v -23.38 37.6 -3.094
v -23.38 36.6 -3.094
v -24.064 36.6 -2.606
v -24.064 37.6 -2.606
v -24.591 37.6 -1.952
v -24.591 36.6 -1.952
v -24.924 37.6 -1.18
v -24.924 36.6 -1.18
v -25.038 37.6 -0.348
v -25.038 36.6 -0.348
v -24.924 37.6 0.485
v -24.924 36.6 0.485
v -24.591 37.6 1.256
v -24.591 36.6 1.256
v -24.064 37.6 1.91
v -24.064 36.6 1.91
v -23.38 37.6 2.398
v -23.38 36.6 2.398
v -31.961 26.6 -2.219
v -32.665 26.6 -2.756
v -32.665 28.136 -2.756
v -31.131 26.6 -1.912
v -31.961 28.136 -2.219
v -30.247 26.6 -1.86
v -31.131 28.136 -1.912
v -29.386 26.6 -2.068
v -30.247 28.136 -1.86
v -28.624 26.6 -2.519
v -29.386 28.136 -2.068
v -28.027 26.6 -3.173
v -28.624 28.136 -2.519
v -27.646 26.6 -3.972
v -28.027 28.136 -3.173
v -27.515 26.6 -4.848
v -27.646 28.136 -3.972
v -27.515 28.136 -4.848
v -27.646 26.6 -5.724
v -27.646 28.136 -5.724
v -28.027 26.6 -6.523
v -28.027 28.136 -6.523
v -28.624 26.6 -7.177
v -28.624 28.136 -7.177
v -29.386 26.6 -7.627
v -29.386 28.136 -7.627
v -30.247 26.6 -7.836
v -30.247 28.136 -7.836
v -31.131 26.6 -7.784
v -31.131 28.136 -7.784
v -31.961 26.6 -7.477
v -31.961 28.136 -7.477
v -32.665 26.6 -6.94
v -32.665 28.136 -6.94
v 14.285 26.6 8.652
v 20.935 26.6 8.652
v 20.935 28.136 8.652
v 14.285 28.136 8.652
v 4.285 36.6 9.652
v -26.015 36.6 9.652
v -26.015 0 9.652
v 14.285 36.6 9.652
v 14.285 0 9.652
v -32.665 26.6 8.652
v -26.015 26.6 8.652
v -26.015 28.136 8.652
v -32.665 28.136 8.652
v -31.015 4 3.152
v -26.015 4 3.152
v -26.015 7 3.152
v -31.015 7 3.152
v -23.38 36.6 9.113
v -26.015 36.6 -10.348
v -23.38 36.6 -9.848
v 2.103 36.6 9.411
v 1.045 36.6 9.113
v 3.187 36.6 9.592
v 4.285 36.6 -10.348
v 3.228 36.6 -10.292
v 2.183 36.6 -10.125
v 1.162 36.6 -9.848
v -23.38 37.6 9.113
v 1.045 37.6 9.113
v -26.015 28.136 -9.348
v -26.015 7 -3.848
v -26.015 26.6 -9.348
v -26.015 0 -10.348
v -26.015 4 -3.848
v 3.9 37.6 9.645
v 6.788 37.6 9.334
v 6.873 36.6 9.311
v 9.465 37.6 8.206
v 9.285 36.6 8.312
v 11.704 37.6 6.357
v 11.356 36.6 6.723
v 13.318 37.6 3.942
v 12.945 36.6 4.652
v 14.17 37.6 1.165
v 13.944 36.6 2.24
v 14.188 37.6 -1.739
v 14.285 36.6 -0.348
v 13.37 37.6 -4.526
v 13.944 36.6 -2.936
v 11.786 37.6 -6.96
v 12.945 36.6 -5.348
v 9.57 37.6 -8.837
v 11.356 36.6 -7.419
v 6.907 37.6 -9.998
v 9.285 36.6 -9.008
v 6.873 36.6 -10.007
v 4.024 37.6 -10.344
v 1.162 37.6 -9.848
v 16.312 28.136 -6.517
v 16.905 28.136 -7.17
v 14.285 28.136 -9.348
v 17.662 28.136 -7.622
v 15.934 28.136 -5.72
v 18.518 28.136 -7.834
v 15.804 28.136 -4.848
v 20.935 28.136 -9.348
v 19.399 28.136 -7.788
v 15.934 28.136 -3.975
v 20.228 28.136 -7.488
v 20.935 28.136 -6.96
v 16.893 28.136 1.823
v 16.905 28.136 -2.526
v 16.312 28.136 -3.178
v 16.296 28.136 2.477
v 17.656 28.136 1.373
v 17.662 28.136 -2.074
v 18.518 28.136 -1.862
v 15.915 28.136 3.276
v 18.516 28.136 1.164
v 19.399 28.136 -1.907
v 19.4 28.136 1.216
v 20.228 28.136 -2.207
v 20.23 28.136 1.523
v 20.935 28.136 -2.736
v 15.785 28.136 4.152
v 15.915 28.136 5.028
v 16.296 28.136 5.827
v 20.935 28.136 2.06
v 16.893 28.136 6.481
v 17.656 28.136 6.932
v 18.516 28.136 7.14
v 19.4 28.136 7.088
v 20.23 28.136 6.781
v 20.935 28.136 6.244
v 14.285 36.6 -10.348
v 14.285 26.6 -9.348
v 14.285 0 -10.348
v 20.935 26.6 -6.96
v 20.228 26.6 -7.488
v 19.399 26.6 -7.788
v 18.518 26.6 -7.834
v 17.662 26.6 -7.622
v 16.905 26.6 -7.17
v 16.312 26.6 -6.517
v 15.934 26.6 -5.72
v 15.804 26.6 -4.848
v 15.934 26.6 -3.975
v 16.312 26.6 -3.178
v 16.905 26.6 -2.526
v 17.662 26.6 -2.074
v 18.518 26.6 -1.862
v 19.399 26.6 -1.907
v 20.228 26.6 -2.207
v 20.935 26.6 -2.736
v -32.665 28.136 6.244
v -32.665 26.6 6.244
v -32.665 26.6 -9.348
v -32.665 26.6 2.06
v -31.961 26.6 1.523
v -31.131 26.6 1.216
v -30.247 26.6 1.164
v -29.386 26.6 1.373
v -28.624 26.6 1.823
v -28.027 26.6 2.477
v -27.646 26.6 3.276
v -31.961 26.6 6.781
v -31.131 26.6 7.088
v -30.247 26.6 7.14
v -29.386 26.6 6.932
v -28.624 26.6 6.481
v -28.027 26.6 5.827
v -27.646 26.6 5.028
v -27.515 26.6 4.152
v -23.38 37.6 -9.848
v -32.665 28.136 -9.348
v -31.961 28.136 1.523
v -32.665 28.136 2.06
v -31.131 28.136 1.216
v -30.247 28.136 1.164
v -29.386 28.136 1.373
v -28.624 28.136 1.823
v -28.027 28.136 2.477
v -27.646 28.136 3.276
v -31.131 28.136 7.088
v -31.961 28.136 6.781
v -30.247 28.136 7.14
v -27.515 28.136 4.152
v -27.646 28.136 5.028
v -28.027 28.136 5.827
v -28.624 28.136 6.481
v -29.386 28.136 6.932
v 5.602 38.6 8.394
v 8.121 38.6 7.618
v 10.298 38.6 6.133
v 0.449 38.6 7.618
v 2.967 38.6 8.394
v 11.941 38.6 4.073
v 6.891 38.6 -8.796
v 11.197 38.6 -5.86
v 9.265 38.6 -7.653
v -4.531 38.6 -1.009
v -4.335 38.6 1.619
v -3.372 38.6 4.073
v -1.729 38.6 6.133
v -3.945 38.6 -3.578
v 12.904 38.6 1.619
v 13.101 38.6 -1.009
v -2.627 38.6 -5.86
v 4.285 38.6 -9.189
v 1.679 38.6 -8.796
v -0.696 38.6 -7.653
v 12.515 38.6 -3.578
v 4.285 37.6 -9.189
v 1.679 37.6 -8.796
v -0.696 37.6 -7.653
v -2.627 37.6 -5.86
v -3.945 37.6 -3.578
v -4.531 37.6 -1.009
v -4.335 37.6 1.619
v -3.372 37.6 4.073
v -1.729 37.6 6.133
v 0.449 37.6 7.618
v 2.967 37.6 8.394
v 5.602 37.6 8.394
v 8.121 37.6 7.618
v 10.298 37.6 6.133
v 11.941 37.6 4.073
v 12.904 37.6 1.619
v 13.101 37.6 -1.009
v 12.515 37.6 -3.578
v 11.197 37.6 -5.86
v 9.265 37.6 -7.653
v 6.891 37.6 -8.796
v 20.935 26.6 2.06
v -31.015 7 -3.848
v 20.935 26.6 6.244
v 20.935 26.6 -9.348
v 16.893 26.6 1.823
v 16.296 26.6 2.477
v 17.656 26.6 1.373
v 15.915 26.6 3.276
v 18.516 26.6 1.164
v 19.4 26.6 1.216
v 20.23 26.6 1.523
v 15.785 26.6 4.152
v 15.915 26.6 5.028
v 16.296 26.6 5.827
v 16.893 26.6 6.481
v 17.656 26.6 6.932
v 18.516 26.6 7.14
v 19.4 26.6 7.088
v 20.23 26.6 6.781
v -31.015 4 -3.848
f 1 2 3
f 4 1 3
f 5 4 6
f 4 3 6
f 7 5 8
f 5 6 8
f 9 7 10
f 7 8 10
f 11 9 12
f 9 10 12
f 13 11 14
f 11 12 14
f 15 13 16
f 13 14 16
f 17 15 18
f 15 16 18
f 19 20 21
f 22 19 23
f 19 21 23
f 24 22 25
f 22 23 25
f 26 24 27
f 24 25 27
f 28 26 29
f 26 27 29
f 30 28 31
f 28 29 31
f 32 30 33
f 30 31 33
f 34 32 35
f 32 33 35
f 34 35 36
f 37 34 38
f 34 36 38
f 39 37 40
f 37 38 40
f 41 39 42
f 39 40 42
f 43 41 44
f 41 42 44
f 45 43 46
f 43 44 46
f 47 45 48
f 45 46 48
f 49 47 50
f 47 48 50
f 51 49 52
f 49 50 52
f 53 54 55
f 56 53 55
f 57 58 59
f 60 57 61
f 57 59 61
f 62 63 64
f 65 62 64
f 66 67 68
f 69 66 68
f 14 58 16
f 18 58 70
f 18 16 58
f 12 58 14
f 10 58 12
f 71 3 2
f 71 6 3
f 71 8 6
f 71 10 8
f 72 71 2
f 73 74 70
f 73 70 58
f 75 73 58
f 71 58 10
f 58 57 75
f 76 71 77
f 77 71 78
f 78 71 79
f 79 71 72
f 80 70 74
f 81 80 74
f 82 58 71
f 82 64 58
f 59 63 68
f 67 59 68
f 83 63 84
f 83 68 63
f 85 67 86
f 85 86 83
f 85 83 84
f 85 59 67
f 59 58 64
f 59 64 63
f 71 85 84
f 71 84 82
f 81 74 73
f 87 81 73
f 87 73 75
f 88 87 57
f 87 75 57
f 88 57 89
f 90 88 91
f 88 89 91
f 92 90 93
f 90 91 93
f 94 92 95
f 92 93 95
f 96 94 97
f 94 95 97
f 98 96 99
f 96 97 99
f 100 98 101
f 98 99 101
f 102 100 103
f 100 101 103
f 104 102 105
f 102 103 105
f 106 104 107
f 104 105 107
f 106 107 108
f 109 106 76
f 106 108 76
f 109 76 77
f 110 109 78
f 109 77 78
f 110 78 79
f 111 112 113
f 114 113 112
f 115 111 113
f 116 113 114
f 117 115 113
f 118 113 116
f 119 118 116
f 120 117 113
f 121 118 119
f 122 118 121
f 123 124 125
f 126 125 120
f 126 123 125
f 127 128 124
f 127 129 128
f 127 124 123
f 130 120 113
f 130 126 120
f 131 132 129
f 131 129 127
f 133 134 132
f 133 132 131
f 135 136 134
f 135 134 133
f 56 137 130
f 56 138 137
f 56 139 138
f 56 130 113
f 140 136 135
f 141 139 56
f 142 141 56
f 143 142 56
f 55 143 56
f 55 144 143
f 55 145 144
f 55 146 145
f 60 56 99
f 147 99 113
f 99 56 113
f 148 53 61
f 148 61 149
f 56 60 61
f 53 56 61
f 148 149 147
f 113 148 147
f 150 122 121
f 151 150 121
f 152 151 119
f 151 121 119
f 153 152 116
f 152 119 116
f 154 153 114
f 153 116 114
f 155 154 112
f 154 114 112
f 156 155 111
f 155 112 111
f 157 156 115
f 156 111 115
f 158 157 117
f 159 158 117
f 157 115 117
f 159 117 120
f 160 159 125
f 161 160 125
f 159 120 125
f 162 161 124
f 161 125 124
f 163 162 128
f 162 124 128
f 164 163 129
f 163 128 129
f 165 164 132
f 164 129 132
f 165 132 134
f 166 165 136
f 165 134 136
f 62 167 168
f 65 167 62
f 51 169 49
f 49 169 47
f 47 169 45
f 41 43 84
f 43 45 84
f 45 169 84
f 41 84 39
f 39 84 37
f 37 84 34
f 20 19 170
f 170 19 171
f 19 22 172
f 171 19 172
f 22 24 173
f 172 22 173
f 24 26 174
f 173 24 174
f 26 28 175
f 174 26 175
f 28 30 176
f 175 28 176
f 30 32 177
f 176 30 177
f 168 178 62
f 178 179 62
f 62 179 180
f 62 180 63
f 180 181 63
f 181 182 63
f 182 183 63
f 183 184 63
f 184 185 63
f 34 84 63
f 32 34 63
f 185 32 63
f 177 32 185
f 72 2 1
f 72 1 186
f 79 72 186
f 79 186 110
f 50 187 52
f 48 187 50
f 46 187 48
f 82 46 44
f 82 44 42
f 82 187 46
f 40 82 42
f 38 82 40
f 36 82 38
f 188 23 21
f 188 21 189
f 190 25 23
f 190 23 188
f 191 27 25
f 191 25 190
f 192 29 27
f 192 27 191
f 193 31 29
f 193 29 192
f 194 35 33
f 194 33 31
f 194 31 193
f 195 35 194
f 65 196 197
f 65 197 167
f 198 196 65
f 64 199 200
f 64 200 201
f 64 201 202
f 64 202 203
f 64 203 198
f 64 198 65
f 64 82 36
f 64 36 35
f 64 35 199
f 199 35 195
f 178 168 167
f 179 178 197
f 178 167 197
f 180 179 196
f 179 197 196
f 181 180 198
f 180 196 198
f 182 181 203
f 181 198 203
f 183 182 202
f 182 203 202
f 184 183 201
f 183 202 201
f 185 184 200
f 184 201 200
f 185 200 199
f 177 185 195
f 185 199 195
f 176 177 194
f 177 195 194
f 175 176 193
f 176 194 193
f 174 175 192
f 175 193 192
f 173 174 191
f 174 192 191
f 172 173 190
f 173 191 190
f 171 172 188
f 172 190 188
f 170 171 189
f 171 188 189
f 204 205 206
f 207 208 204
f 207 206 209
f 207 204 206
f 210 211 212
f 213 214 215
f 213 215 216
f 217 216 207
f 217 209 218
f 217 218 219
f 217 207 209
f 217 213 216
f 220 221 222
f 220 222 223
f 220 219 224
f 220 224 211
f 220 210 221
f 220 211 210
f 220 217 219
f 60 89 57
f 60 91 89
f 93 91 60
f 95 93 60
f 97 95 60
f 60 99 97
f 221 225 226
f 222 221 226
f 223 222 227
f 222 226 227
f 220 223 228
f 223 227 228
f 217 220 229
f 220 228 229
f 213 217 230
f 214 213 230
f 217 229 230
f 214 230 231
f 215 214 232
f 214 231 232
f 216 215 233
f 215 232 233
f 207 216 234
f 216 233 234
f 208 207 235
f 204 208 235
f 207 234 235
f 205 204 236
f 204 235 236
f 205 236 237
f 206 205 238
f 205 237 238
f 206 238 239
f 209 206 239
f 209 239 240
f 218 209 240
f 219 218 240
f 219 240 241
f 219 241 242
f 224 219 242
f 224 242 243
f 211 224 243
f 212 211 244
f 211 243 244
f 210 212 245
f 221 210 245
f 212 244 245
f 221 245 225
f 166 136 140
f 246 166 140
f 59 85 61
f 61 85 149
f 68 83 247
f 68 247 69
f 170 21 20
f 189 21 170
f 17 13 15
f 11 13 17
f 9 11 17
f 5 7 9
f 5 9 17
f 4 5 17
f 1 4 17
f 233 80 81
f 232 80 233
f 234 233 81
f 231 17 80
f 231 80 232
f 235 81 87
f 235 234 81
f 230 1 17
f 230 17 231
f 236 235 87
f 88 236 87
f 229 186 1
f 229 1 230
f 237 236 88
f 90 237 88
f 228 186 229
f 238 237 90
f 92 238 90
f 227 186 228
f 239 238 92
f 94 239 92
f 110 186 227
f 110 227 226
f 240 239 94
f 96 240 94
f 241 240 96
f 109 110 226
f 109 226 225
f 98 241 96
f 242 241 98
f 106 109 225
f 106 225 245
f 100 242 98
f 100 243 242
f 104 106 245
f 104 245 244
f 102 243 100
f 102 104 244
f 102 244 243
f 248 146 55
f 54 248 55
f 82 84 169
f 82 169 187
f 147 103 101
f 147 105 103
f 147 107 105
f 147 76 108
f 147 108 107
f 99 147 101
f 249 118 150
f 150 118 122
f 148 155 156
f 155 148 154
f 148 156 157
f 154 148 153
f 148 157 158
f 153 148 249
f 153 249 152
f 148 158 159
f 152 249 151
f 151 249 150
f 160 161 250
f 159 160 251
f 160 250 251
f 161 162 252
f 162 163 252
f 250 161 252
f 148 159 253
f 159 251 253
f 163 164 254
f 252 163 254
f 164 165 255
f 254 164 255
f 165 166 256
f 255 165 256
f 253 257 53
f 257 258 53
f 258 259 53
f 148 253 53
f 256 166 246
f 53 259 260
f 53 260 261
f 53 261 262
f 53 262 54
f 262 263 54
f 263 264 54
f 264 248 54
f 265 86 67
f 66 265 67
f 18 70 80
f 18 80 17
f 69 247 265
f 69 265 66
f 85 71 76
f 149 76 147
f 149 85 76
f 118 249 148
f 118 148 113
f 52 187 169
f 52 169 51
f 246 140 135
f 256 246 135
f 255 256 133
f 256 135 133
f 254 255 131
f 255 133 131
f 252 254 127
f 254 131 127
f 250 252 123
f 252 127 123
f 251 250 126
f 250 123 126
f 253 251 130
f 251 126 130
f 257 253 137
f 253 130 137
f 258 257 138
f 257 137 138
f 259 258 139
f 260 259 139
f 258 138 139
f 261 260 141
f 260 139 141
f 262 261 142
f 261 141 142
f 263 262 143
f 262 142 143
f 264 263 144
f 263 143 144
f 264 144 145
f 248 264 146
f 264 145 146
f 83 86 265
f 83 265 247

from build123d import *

# Parameters (mm, degrees)
SKETCH1_W                = 40.3
SKETCH1_H                = 20
BOSS_EXTRUDE1_DEPTH      = 36.6
SKETCH5_R                = 10
SKETCH5_R_2              = 3.103657719
SKETCH5_W                = 24.542402665
SKETCH5_H                = 18.960707226
BOSS_EXTRUDE4_DEPTH      = 1
SKETCH7_R                = 8.840936892
BOSS_EXTRUDE5_DEPTH      = 1
BOSS_EXTRUDE7_DEPTH      = 6.65
BOSS_EXTRUDE7_DEPTH_BACK = 46.95
SKETCH8_W                = 18
SKETCH8_H                = 1.536098692
SKETCH10_R               = 3
CUT_EXTRUDE2_DEPTH       = 45.336639532
SKETCH12_R               = 3
CUT_EXTRUDE3_DEPTH       = 45.336639532
SKETCH16_W               = 7
SKETCH16_H               = 3
BOSS_EXTRUDE8_DEPTH      = 5


with BuildPart() as part:
    # Sketch1 → Boss-Extrude1 (new body)
    with BuildSketch(Plane(origin=(0, 0, 0), x_dir=(1, 0, 0), z_dir=(0, 1, 0))):
        with Locations((-5.865266654, 0.347845658)):
            Rectangle(SKETCH1_W, SKETCH1_H)
    extrude(amount=BOSS_EXTRUDE1_DEPTH)

    # Sketch5 → Boss-Extrude4 (add)
    with BuildSketch(Plane(origin=(0, 36.6, 0), x_dir=(1, 0, 0), z_dir=(0, 1, 0))):
        with Locations((4.284733346, 0.347845658)):
            Circle(SKETCH5_R)
        with Locations((-21.934362756, 0.347845658)):
            Circle(SKETCH5_R_2)
        with Locations((-11.108966986, 0.367492045)):
            Rectangle(SKETCH5_W, SKETCH5_H)
    extrude(amount=BOSS_EXTRUDE4_DEPTH)

    # Sketch7 → Boss-Extrude5 (add)
    with BuildSketch(Plane(origin=(0, 37.6, 0), x_dir=(1, 0, 0), z_dir=(0, 1, 0))):
        with Locations(Location((4.284733346, 0.347845658, 0), (0, 0, 90))):
            Circle(SKETCH7_R)
    extrude(amount=BOSS_EXTRUDE5_DEPTH)

    # Sketch8 → Boss-Extrude7 (add, two sides: drawn at the far end of the back side and taken through both)
    with BuildSketch(Plane.ZY.offset(26.015266654).offset(-BOSS_EXTRUDE7_DEPTH_BACK)):
        with Locations((-0.347845658, 27.368049346)):
            Rectangle(SKETCH8_W, SKETCH8_H)
    extrude(amount=BOSS_EXTRUDE7_DEPTH + BOSS_EXTRUDE7_DEPTH_BACK)

    # Sketch10 → Cut-Extrude2 (cut, through all)
    with BuildSketch(Plane(origin=(0, 28.136098692, 0), x_dir=(1, 0, 0), z_dir=(0, 1, 0))):
        with Locations((18.80418216, 4.847845658)):
            Circle(SKETCH10_R)
        with Locations((18.784733346, -4.152133328)):
            Circle(SKETCH10_R)
    extrude(amount=-CUT_EXTRUDE2_DEPTH, mode=Mode.SUBTRACT)

    # Sketch12 → Cut-Extrude3 (cut, through all)
    with BuildSketch(Plane(origin=(0, 28.136098692, 0), x_dir=(1, 0, 0), z_dir=(0, 1, 0))):
        with Locations((-30.515266654, 4.847845658)):
            Circle(SKETCH12_R)
        with Locations((-30.515266654, -4.152154342)):
            Circle(SKETCH12_R)
    extrude(amount=-CUT_EXTRUDE3_DEPTH, mode=Mode.SUBTRACT)

    # Sketch16 → Boss-Extrude8 (add)
    with BuildSketch(Plane.ZY.offset(26.015266654)):
        with Locations((-0.347845658, 5.5)):
            Rectangle(SKETCH16_W, SKETCH16_H)
    extrude(amount=BOSS_EXTRUDE8_DEPTH)


solid = part.part
